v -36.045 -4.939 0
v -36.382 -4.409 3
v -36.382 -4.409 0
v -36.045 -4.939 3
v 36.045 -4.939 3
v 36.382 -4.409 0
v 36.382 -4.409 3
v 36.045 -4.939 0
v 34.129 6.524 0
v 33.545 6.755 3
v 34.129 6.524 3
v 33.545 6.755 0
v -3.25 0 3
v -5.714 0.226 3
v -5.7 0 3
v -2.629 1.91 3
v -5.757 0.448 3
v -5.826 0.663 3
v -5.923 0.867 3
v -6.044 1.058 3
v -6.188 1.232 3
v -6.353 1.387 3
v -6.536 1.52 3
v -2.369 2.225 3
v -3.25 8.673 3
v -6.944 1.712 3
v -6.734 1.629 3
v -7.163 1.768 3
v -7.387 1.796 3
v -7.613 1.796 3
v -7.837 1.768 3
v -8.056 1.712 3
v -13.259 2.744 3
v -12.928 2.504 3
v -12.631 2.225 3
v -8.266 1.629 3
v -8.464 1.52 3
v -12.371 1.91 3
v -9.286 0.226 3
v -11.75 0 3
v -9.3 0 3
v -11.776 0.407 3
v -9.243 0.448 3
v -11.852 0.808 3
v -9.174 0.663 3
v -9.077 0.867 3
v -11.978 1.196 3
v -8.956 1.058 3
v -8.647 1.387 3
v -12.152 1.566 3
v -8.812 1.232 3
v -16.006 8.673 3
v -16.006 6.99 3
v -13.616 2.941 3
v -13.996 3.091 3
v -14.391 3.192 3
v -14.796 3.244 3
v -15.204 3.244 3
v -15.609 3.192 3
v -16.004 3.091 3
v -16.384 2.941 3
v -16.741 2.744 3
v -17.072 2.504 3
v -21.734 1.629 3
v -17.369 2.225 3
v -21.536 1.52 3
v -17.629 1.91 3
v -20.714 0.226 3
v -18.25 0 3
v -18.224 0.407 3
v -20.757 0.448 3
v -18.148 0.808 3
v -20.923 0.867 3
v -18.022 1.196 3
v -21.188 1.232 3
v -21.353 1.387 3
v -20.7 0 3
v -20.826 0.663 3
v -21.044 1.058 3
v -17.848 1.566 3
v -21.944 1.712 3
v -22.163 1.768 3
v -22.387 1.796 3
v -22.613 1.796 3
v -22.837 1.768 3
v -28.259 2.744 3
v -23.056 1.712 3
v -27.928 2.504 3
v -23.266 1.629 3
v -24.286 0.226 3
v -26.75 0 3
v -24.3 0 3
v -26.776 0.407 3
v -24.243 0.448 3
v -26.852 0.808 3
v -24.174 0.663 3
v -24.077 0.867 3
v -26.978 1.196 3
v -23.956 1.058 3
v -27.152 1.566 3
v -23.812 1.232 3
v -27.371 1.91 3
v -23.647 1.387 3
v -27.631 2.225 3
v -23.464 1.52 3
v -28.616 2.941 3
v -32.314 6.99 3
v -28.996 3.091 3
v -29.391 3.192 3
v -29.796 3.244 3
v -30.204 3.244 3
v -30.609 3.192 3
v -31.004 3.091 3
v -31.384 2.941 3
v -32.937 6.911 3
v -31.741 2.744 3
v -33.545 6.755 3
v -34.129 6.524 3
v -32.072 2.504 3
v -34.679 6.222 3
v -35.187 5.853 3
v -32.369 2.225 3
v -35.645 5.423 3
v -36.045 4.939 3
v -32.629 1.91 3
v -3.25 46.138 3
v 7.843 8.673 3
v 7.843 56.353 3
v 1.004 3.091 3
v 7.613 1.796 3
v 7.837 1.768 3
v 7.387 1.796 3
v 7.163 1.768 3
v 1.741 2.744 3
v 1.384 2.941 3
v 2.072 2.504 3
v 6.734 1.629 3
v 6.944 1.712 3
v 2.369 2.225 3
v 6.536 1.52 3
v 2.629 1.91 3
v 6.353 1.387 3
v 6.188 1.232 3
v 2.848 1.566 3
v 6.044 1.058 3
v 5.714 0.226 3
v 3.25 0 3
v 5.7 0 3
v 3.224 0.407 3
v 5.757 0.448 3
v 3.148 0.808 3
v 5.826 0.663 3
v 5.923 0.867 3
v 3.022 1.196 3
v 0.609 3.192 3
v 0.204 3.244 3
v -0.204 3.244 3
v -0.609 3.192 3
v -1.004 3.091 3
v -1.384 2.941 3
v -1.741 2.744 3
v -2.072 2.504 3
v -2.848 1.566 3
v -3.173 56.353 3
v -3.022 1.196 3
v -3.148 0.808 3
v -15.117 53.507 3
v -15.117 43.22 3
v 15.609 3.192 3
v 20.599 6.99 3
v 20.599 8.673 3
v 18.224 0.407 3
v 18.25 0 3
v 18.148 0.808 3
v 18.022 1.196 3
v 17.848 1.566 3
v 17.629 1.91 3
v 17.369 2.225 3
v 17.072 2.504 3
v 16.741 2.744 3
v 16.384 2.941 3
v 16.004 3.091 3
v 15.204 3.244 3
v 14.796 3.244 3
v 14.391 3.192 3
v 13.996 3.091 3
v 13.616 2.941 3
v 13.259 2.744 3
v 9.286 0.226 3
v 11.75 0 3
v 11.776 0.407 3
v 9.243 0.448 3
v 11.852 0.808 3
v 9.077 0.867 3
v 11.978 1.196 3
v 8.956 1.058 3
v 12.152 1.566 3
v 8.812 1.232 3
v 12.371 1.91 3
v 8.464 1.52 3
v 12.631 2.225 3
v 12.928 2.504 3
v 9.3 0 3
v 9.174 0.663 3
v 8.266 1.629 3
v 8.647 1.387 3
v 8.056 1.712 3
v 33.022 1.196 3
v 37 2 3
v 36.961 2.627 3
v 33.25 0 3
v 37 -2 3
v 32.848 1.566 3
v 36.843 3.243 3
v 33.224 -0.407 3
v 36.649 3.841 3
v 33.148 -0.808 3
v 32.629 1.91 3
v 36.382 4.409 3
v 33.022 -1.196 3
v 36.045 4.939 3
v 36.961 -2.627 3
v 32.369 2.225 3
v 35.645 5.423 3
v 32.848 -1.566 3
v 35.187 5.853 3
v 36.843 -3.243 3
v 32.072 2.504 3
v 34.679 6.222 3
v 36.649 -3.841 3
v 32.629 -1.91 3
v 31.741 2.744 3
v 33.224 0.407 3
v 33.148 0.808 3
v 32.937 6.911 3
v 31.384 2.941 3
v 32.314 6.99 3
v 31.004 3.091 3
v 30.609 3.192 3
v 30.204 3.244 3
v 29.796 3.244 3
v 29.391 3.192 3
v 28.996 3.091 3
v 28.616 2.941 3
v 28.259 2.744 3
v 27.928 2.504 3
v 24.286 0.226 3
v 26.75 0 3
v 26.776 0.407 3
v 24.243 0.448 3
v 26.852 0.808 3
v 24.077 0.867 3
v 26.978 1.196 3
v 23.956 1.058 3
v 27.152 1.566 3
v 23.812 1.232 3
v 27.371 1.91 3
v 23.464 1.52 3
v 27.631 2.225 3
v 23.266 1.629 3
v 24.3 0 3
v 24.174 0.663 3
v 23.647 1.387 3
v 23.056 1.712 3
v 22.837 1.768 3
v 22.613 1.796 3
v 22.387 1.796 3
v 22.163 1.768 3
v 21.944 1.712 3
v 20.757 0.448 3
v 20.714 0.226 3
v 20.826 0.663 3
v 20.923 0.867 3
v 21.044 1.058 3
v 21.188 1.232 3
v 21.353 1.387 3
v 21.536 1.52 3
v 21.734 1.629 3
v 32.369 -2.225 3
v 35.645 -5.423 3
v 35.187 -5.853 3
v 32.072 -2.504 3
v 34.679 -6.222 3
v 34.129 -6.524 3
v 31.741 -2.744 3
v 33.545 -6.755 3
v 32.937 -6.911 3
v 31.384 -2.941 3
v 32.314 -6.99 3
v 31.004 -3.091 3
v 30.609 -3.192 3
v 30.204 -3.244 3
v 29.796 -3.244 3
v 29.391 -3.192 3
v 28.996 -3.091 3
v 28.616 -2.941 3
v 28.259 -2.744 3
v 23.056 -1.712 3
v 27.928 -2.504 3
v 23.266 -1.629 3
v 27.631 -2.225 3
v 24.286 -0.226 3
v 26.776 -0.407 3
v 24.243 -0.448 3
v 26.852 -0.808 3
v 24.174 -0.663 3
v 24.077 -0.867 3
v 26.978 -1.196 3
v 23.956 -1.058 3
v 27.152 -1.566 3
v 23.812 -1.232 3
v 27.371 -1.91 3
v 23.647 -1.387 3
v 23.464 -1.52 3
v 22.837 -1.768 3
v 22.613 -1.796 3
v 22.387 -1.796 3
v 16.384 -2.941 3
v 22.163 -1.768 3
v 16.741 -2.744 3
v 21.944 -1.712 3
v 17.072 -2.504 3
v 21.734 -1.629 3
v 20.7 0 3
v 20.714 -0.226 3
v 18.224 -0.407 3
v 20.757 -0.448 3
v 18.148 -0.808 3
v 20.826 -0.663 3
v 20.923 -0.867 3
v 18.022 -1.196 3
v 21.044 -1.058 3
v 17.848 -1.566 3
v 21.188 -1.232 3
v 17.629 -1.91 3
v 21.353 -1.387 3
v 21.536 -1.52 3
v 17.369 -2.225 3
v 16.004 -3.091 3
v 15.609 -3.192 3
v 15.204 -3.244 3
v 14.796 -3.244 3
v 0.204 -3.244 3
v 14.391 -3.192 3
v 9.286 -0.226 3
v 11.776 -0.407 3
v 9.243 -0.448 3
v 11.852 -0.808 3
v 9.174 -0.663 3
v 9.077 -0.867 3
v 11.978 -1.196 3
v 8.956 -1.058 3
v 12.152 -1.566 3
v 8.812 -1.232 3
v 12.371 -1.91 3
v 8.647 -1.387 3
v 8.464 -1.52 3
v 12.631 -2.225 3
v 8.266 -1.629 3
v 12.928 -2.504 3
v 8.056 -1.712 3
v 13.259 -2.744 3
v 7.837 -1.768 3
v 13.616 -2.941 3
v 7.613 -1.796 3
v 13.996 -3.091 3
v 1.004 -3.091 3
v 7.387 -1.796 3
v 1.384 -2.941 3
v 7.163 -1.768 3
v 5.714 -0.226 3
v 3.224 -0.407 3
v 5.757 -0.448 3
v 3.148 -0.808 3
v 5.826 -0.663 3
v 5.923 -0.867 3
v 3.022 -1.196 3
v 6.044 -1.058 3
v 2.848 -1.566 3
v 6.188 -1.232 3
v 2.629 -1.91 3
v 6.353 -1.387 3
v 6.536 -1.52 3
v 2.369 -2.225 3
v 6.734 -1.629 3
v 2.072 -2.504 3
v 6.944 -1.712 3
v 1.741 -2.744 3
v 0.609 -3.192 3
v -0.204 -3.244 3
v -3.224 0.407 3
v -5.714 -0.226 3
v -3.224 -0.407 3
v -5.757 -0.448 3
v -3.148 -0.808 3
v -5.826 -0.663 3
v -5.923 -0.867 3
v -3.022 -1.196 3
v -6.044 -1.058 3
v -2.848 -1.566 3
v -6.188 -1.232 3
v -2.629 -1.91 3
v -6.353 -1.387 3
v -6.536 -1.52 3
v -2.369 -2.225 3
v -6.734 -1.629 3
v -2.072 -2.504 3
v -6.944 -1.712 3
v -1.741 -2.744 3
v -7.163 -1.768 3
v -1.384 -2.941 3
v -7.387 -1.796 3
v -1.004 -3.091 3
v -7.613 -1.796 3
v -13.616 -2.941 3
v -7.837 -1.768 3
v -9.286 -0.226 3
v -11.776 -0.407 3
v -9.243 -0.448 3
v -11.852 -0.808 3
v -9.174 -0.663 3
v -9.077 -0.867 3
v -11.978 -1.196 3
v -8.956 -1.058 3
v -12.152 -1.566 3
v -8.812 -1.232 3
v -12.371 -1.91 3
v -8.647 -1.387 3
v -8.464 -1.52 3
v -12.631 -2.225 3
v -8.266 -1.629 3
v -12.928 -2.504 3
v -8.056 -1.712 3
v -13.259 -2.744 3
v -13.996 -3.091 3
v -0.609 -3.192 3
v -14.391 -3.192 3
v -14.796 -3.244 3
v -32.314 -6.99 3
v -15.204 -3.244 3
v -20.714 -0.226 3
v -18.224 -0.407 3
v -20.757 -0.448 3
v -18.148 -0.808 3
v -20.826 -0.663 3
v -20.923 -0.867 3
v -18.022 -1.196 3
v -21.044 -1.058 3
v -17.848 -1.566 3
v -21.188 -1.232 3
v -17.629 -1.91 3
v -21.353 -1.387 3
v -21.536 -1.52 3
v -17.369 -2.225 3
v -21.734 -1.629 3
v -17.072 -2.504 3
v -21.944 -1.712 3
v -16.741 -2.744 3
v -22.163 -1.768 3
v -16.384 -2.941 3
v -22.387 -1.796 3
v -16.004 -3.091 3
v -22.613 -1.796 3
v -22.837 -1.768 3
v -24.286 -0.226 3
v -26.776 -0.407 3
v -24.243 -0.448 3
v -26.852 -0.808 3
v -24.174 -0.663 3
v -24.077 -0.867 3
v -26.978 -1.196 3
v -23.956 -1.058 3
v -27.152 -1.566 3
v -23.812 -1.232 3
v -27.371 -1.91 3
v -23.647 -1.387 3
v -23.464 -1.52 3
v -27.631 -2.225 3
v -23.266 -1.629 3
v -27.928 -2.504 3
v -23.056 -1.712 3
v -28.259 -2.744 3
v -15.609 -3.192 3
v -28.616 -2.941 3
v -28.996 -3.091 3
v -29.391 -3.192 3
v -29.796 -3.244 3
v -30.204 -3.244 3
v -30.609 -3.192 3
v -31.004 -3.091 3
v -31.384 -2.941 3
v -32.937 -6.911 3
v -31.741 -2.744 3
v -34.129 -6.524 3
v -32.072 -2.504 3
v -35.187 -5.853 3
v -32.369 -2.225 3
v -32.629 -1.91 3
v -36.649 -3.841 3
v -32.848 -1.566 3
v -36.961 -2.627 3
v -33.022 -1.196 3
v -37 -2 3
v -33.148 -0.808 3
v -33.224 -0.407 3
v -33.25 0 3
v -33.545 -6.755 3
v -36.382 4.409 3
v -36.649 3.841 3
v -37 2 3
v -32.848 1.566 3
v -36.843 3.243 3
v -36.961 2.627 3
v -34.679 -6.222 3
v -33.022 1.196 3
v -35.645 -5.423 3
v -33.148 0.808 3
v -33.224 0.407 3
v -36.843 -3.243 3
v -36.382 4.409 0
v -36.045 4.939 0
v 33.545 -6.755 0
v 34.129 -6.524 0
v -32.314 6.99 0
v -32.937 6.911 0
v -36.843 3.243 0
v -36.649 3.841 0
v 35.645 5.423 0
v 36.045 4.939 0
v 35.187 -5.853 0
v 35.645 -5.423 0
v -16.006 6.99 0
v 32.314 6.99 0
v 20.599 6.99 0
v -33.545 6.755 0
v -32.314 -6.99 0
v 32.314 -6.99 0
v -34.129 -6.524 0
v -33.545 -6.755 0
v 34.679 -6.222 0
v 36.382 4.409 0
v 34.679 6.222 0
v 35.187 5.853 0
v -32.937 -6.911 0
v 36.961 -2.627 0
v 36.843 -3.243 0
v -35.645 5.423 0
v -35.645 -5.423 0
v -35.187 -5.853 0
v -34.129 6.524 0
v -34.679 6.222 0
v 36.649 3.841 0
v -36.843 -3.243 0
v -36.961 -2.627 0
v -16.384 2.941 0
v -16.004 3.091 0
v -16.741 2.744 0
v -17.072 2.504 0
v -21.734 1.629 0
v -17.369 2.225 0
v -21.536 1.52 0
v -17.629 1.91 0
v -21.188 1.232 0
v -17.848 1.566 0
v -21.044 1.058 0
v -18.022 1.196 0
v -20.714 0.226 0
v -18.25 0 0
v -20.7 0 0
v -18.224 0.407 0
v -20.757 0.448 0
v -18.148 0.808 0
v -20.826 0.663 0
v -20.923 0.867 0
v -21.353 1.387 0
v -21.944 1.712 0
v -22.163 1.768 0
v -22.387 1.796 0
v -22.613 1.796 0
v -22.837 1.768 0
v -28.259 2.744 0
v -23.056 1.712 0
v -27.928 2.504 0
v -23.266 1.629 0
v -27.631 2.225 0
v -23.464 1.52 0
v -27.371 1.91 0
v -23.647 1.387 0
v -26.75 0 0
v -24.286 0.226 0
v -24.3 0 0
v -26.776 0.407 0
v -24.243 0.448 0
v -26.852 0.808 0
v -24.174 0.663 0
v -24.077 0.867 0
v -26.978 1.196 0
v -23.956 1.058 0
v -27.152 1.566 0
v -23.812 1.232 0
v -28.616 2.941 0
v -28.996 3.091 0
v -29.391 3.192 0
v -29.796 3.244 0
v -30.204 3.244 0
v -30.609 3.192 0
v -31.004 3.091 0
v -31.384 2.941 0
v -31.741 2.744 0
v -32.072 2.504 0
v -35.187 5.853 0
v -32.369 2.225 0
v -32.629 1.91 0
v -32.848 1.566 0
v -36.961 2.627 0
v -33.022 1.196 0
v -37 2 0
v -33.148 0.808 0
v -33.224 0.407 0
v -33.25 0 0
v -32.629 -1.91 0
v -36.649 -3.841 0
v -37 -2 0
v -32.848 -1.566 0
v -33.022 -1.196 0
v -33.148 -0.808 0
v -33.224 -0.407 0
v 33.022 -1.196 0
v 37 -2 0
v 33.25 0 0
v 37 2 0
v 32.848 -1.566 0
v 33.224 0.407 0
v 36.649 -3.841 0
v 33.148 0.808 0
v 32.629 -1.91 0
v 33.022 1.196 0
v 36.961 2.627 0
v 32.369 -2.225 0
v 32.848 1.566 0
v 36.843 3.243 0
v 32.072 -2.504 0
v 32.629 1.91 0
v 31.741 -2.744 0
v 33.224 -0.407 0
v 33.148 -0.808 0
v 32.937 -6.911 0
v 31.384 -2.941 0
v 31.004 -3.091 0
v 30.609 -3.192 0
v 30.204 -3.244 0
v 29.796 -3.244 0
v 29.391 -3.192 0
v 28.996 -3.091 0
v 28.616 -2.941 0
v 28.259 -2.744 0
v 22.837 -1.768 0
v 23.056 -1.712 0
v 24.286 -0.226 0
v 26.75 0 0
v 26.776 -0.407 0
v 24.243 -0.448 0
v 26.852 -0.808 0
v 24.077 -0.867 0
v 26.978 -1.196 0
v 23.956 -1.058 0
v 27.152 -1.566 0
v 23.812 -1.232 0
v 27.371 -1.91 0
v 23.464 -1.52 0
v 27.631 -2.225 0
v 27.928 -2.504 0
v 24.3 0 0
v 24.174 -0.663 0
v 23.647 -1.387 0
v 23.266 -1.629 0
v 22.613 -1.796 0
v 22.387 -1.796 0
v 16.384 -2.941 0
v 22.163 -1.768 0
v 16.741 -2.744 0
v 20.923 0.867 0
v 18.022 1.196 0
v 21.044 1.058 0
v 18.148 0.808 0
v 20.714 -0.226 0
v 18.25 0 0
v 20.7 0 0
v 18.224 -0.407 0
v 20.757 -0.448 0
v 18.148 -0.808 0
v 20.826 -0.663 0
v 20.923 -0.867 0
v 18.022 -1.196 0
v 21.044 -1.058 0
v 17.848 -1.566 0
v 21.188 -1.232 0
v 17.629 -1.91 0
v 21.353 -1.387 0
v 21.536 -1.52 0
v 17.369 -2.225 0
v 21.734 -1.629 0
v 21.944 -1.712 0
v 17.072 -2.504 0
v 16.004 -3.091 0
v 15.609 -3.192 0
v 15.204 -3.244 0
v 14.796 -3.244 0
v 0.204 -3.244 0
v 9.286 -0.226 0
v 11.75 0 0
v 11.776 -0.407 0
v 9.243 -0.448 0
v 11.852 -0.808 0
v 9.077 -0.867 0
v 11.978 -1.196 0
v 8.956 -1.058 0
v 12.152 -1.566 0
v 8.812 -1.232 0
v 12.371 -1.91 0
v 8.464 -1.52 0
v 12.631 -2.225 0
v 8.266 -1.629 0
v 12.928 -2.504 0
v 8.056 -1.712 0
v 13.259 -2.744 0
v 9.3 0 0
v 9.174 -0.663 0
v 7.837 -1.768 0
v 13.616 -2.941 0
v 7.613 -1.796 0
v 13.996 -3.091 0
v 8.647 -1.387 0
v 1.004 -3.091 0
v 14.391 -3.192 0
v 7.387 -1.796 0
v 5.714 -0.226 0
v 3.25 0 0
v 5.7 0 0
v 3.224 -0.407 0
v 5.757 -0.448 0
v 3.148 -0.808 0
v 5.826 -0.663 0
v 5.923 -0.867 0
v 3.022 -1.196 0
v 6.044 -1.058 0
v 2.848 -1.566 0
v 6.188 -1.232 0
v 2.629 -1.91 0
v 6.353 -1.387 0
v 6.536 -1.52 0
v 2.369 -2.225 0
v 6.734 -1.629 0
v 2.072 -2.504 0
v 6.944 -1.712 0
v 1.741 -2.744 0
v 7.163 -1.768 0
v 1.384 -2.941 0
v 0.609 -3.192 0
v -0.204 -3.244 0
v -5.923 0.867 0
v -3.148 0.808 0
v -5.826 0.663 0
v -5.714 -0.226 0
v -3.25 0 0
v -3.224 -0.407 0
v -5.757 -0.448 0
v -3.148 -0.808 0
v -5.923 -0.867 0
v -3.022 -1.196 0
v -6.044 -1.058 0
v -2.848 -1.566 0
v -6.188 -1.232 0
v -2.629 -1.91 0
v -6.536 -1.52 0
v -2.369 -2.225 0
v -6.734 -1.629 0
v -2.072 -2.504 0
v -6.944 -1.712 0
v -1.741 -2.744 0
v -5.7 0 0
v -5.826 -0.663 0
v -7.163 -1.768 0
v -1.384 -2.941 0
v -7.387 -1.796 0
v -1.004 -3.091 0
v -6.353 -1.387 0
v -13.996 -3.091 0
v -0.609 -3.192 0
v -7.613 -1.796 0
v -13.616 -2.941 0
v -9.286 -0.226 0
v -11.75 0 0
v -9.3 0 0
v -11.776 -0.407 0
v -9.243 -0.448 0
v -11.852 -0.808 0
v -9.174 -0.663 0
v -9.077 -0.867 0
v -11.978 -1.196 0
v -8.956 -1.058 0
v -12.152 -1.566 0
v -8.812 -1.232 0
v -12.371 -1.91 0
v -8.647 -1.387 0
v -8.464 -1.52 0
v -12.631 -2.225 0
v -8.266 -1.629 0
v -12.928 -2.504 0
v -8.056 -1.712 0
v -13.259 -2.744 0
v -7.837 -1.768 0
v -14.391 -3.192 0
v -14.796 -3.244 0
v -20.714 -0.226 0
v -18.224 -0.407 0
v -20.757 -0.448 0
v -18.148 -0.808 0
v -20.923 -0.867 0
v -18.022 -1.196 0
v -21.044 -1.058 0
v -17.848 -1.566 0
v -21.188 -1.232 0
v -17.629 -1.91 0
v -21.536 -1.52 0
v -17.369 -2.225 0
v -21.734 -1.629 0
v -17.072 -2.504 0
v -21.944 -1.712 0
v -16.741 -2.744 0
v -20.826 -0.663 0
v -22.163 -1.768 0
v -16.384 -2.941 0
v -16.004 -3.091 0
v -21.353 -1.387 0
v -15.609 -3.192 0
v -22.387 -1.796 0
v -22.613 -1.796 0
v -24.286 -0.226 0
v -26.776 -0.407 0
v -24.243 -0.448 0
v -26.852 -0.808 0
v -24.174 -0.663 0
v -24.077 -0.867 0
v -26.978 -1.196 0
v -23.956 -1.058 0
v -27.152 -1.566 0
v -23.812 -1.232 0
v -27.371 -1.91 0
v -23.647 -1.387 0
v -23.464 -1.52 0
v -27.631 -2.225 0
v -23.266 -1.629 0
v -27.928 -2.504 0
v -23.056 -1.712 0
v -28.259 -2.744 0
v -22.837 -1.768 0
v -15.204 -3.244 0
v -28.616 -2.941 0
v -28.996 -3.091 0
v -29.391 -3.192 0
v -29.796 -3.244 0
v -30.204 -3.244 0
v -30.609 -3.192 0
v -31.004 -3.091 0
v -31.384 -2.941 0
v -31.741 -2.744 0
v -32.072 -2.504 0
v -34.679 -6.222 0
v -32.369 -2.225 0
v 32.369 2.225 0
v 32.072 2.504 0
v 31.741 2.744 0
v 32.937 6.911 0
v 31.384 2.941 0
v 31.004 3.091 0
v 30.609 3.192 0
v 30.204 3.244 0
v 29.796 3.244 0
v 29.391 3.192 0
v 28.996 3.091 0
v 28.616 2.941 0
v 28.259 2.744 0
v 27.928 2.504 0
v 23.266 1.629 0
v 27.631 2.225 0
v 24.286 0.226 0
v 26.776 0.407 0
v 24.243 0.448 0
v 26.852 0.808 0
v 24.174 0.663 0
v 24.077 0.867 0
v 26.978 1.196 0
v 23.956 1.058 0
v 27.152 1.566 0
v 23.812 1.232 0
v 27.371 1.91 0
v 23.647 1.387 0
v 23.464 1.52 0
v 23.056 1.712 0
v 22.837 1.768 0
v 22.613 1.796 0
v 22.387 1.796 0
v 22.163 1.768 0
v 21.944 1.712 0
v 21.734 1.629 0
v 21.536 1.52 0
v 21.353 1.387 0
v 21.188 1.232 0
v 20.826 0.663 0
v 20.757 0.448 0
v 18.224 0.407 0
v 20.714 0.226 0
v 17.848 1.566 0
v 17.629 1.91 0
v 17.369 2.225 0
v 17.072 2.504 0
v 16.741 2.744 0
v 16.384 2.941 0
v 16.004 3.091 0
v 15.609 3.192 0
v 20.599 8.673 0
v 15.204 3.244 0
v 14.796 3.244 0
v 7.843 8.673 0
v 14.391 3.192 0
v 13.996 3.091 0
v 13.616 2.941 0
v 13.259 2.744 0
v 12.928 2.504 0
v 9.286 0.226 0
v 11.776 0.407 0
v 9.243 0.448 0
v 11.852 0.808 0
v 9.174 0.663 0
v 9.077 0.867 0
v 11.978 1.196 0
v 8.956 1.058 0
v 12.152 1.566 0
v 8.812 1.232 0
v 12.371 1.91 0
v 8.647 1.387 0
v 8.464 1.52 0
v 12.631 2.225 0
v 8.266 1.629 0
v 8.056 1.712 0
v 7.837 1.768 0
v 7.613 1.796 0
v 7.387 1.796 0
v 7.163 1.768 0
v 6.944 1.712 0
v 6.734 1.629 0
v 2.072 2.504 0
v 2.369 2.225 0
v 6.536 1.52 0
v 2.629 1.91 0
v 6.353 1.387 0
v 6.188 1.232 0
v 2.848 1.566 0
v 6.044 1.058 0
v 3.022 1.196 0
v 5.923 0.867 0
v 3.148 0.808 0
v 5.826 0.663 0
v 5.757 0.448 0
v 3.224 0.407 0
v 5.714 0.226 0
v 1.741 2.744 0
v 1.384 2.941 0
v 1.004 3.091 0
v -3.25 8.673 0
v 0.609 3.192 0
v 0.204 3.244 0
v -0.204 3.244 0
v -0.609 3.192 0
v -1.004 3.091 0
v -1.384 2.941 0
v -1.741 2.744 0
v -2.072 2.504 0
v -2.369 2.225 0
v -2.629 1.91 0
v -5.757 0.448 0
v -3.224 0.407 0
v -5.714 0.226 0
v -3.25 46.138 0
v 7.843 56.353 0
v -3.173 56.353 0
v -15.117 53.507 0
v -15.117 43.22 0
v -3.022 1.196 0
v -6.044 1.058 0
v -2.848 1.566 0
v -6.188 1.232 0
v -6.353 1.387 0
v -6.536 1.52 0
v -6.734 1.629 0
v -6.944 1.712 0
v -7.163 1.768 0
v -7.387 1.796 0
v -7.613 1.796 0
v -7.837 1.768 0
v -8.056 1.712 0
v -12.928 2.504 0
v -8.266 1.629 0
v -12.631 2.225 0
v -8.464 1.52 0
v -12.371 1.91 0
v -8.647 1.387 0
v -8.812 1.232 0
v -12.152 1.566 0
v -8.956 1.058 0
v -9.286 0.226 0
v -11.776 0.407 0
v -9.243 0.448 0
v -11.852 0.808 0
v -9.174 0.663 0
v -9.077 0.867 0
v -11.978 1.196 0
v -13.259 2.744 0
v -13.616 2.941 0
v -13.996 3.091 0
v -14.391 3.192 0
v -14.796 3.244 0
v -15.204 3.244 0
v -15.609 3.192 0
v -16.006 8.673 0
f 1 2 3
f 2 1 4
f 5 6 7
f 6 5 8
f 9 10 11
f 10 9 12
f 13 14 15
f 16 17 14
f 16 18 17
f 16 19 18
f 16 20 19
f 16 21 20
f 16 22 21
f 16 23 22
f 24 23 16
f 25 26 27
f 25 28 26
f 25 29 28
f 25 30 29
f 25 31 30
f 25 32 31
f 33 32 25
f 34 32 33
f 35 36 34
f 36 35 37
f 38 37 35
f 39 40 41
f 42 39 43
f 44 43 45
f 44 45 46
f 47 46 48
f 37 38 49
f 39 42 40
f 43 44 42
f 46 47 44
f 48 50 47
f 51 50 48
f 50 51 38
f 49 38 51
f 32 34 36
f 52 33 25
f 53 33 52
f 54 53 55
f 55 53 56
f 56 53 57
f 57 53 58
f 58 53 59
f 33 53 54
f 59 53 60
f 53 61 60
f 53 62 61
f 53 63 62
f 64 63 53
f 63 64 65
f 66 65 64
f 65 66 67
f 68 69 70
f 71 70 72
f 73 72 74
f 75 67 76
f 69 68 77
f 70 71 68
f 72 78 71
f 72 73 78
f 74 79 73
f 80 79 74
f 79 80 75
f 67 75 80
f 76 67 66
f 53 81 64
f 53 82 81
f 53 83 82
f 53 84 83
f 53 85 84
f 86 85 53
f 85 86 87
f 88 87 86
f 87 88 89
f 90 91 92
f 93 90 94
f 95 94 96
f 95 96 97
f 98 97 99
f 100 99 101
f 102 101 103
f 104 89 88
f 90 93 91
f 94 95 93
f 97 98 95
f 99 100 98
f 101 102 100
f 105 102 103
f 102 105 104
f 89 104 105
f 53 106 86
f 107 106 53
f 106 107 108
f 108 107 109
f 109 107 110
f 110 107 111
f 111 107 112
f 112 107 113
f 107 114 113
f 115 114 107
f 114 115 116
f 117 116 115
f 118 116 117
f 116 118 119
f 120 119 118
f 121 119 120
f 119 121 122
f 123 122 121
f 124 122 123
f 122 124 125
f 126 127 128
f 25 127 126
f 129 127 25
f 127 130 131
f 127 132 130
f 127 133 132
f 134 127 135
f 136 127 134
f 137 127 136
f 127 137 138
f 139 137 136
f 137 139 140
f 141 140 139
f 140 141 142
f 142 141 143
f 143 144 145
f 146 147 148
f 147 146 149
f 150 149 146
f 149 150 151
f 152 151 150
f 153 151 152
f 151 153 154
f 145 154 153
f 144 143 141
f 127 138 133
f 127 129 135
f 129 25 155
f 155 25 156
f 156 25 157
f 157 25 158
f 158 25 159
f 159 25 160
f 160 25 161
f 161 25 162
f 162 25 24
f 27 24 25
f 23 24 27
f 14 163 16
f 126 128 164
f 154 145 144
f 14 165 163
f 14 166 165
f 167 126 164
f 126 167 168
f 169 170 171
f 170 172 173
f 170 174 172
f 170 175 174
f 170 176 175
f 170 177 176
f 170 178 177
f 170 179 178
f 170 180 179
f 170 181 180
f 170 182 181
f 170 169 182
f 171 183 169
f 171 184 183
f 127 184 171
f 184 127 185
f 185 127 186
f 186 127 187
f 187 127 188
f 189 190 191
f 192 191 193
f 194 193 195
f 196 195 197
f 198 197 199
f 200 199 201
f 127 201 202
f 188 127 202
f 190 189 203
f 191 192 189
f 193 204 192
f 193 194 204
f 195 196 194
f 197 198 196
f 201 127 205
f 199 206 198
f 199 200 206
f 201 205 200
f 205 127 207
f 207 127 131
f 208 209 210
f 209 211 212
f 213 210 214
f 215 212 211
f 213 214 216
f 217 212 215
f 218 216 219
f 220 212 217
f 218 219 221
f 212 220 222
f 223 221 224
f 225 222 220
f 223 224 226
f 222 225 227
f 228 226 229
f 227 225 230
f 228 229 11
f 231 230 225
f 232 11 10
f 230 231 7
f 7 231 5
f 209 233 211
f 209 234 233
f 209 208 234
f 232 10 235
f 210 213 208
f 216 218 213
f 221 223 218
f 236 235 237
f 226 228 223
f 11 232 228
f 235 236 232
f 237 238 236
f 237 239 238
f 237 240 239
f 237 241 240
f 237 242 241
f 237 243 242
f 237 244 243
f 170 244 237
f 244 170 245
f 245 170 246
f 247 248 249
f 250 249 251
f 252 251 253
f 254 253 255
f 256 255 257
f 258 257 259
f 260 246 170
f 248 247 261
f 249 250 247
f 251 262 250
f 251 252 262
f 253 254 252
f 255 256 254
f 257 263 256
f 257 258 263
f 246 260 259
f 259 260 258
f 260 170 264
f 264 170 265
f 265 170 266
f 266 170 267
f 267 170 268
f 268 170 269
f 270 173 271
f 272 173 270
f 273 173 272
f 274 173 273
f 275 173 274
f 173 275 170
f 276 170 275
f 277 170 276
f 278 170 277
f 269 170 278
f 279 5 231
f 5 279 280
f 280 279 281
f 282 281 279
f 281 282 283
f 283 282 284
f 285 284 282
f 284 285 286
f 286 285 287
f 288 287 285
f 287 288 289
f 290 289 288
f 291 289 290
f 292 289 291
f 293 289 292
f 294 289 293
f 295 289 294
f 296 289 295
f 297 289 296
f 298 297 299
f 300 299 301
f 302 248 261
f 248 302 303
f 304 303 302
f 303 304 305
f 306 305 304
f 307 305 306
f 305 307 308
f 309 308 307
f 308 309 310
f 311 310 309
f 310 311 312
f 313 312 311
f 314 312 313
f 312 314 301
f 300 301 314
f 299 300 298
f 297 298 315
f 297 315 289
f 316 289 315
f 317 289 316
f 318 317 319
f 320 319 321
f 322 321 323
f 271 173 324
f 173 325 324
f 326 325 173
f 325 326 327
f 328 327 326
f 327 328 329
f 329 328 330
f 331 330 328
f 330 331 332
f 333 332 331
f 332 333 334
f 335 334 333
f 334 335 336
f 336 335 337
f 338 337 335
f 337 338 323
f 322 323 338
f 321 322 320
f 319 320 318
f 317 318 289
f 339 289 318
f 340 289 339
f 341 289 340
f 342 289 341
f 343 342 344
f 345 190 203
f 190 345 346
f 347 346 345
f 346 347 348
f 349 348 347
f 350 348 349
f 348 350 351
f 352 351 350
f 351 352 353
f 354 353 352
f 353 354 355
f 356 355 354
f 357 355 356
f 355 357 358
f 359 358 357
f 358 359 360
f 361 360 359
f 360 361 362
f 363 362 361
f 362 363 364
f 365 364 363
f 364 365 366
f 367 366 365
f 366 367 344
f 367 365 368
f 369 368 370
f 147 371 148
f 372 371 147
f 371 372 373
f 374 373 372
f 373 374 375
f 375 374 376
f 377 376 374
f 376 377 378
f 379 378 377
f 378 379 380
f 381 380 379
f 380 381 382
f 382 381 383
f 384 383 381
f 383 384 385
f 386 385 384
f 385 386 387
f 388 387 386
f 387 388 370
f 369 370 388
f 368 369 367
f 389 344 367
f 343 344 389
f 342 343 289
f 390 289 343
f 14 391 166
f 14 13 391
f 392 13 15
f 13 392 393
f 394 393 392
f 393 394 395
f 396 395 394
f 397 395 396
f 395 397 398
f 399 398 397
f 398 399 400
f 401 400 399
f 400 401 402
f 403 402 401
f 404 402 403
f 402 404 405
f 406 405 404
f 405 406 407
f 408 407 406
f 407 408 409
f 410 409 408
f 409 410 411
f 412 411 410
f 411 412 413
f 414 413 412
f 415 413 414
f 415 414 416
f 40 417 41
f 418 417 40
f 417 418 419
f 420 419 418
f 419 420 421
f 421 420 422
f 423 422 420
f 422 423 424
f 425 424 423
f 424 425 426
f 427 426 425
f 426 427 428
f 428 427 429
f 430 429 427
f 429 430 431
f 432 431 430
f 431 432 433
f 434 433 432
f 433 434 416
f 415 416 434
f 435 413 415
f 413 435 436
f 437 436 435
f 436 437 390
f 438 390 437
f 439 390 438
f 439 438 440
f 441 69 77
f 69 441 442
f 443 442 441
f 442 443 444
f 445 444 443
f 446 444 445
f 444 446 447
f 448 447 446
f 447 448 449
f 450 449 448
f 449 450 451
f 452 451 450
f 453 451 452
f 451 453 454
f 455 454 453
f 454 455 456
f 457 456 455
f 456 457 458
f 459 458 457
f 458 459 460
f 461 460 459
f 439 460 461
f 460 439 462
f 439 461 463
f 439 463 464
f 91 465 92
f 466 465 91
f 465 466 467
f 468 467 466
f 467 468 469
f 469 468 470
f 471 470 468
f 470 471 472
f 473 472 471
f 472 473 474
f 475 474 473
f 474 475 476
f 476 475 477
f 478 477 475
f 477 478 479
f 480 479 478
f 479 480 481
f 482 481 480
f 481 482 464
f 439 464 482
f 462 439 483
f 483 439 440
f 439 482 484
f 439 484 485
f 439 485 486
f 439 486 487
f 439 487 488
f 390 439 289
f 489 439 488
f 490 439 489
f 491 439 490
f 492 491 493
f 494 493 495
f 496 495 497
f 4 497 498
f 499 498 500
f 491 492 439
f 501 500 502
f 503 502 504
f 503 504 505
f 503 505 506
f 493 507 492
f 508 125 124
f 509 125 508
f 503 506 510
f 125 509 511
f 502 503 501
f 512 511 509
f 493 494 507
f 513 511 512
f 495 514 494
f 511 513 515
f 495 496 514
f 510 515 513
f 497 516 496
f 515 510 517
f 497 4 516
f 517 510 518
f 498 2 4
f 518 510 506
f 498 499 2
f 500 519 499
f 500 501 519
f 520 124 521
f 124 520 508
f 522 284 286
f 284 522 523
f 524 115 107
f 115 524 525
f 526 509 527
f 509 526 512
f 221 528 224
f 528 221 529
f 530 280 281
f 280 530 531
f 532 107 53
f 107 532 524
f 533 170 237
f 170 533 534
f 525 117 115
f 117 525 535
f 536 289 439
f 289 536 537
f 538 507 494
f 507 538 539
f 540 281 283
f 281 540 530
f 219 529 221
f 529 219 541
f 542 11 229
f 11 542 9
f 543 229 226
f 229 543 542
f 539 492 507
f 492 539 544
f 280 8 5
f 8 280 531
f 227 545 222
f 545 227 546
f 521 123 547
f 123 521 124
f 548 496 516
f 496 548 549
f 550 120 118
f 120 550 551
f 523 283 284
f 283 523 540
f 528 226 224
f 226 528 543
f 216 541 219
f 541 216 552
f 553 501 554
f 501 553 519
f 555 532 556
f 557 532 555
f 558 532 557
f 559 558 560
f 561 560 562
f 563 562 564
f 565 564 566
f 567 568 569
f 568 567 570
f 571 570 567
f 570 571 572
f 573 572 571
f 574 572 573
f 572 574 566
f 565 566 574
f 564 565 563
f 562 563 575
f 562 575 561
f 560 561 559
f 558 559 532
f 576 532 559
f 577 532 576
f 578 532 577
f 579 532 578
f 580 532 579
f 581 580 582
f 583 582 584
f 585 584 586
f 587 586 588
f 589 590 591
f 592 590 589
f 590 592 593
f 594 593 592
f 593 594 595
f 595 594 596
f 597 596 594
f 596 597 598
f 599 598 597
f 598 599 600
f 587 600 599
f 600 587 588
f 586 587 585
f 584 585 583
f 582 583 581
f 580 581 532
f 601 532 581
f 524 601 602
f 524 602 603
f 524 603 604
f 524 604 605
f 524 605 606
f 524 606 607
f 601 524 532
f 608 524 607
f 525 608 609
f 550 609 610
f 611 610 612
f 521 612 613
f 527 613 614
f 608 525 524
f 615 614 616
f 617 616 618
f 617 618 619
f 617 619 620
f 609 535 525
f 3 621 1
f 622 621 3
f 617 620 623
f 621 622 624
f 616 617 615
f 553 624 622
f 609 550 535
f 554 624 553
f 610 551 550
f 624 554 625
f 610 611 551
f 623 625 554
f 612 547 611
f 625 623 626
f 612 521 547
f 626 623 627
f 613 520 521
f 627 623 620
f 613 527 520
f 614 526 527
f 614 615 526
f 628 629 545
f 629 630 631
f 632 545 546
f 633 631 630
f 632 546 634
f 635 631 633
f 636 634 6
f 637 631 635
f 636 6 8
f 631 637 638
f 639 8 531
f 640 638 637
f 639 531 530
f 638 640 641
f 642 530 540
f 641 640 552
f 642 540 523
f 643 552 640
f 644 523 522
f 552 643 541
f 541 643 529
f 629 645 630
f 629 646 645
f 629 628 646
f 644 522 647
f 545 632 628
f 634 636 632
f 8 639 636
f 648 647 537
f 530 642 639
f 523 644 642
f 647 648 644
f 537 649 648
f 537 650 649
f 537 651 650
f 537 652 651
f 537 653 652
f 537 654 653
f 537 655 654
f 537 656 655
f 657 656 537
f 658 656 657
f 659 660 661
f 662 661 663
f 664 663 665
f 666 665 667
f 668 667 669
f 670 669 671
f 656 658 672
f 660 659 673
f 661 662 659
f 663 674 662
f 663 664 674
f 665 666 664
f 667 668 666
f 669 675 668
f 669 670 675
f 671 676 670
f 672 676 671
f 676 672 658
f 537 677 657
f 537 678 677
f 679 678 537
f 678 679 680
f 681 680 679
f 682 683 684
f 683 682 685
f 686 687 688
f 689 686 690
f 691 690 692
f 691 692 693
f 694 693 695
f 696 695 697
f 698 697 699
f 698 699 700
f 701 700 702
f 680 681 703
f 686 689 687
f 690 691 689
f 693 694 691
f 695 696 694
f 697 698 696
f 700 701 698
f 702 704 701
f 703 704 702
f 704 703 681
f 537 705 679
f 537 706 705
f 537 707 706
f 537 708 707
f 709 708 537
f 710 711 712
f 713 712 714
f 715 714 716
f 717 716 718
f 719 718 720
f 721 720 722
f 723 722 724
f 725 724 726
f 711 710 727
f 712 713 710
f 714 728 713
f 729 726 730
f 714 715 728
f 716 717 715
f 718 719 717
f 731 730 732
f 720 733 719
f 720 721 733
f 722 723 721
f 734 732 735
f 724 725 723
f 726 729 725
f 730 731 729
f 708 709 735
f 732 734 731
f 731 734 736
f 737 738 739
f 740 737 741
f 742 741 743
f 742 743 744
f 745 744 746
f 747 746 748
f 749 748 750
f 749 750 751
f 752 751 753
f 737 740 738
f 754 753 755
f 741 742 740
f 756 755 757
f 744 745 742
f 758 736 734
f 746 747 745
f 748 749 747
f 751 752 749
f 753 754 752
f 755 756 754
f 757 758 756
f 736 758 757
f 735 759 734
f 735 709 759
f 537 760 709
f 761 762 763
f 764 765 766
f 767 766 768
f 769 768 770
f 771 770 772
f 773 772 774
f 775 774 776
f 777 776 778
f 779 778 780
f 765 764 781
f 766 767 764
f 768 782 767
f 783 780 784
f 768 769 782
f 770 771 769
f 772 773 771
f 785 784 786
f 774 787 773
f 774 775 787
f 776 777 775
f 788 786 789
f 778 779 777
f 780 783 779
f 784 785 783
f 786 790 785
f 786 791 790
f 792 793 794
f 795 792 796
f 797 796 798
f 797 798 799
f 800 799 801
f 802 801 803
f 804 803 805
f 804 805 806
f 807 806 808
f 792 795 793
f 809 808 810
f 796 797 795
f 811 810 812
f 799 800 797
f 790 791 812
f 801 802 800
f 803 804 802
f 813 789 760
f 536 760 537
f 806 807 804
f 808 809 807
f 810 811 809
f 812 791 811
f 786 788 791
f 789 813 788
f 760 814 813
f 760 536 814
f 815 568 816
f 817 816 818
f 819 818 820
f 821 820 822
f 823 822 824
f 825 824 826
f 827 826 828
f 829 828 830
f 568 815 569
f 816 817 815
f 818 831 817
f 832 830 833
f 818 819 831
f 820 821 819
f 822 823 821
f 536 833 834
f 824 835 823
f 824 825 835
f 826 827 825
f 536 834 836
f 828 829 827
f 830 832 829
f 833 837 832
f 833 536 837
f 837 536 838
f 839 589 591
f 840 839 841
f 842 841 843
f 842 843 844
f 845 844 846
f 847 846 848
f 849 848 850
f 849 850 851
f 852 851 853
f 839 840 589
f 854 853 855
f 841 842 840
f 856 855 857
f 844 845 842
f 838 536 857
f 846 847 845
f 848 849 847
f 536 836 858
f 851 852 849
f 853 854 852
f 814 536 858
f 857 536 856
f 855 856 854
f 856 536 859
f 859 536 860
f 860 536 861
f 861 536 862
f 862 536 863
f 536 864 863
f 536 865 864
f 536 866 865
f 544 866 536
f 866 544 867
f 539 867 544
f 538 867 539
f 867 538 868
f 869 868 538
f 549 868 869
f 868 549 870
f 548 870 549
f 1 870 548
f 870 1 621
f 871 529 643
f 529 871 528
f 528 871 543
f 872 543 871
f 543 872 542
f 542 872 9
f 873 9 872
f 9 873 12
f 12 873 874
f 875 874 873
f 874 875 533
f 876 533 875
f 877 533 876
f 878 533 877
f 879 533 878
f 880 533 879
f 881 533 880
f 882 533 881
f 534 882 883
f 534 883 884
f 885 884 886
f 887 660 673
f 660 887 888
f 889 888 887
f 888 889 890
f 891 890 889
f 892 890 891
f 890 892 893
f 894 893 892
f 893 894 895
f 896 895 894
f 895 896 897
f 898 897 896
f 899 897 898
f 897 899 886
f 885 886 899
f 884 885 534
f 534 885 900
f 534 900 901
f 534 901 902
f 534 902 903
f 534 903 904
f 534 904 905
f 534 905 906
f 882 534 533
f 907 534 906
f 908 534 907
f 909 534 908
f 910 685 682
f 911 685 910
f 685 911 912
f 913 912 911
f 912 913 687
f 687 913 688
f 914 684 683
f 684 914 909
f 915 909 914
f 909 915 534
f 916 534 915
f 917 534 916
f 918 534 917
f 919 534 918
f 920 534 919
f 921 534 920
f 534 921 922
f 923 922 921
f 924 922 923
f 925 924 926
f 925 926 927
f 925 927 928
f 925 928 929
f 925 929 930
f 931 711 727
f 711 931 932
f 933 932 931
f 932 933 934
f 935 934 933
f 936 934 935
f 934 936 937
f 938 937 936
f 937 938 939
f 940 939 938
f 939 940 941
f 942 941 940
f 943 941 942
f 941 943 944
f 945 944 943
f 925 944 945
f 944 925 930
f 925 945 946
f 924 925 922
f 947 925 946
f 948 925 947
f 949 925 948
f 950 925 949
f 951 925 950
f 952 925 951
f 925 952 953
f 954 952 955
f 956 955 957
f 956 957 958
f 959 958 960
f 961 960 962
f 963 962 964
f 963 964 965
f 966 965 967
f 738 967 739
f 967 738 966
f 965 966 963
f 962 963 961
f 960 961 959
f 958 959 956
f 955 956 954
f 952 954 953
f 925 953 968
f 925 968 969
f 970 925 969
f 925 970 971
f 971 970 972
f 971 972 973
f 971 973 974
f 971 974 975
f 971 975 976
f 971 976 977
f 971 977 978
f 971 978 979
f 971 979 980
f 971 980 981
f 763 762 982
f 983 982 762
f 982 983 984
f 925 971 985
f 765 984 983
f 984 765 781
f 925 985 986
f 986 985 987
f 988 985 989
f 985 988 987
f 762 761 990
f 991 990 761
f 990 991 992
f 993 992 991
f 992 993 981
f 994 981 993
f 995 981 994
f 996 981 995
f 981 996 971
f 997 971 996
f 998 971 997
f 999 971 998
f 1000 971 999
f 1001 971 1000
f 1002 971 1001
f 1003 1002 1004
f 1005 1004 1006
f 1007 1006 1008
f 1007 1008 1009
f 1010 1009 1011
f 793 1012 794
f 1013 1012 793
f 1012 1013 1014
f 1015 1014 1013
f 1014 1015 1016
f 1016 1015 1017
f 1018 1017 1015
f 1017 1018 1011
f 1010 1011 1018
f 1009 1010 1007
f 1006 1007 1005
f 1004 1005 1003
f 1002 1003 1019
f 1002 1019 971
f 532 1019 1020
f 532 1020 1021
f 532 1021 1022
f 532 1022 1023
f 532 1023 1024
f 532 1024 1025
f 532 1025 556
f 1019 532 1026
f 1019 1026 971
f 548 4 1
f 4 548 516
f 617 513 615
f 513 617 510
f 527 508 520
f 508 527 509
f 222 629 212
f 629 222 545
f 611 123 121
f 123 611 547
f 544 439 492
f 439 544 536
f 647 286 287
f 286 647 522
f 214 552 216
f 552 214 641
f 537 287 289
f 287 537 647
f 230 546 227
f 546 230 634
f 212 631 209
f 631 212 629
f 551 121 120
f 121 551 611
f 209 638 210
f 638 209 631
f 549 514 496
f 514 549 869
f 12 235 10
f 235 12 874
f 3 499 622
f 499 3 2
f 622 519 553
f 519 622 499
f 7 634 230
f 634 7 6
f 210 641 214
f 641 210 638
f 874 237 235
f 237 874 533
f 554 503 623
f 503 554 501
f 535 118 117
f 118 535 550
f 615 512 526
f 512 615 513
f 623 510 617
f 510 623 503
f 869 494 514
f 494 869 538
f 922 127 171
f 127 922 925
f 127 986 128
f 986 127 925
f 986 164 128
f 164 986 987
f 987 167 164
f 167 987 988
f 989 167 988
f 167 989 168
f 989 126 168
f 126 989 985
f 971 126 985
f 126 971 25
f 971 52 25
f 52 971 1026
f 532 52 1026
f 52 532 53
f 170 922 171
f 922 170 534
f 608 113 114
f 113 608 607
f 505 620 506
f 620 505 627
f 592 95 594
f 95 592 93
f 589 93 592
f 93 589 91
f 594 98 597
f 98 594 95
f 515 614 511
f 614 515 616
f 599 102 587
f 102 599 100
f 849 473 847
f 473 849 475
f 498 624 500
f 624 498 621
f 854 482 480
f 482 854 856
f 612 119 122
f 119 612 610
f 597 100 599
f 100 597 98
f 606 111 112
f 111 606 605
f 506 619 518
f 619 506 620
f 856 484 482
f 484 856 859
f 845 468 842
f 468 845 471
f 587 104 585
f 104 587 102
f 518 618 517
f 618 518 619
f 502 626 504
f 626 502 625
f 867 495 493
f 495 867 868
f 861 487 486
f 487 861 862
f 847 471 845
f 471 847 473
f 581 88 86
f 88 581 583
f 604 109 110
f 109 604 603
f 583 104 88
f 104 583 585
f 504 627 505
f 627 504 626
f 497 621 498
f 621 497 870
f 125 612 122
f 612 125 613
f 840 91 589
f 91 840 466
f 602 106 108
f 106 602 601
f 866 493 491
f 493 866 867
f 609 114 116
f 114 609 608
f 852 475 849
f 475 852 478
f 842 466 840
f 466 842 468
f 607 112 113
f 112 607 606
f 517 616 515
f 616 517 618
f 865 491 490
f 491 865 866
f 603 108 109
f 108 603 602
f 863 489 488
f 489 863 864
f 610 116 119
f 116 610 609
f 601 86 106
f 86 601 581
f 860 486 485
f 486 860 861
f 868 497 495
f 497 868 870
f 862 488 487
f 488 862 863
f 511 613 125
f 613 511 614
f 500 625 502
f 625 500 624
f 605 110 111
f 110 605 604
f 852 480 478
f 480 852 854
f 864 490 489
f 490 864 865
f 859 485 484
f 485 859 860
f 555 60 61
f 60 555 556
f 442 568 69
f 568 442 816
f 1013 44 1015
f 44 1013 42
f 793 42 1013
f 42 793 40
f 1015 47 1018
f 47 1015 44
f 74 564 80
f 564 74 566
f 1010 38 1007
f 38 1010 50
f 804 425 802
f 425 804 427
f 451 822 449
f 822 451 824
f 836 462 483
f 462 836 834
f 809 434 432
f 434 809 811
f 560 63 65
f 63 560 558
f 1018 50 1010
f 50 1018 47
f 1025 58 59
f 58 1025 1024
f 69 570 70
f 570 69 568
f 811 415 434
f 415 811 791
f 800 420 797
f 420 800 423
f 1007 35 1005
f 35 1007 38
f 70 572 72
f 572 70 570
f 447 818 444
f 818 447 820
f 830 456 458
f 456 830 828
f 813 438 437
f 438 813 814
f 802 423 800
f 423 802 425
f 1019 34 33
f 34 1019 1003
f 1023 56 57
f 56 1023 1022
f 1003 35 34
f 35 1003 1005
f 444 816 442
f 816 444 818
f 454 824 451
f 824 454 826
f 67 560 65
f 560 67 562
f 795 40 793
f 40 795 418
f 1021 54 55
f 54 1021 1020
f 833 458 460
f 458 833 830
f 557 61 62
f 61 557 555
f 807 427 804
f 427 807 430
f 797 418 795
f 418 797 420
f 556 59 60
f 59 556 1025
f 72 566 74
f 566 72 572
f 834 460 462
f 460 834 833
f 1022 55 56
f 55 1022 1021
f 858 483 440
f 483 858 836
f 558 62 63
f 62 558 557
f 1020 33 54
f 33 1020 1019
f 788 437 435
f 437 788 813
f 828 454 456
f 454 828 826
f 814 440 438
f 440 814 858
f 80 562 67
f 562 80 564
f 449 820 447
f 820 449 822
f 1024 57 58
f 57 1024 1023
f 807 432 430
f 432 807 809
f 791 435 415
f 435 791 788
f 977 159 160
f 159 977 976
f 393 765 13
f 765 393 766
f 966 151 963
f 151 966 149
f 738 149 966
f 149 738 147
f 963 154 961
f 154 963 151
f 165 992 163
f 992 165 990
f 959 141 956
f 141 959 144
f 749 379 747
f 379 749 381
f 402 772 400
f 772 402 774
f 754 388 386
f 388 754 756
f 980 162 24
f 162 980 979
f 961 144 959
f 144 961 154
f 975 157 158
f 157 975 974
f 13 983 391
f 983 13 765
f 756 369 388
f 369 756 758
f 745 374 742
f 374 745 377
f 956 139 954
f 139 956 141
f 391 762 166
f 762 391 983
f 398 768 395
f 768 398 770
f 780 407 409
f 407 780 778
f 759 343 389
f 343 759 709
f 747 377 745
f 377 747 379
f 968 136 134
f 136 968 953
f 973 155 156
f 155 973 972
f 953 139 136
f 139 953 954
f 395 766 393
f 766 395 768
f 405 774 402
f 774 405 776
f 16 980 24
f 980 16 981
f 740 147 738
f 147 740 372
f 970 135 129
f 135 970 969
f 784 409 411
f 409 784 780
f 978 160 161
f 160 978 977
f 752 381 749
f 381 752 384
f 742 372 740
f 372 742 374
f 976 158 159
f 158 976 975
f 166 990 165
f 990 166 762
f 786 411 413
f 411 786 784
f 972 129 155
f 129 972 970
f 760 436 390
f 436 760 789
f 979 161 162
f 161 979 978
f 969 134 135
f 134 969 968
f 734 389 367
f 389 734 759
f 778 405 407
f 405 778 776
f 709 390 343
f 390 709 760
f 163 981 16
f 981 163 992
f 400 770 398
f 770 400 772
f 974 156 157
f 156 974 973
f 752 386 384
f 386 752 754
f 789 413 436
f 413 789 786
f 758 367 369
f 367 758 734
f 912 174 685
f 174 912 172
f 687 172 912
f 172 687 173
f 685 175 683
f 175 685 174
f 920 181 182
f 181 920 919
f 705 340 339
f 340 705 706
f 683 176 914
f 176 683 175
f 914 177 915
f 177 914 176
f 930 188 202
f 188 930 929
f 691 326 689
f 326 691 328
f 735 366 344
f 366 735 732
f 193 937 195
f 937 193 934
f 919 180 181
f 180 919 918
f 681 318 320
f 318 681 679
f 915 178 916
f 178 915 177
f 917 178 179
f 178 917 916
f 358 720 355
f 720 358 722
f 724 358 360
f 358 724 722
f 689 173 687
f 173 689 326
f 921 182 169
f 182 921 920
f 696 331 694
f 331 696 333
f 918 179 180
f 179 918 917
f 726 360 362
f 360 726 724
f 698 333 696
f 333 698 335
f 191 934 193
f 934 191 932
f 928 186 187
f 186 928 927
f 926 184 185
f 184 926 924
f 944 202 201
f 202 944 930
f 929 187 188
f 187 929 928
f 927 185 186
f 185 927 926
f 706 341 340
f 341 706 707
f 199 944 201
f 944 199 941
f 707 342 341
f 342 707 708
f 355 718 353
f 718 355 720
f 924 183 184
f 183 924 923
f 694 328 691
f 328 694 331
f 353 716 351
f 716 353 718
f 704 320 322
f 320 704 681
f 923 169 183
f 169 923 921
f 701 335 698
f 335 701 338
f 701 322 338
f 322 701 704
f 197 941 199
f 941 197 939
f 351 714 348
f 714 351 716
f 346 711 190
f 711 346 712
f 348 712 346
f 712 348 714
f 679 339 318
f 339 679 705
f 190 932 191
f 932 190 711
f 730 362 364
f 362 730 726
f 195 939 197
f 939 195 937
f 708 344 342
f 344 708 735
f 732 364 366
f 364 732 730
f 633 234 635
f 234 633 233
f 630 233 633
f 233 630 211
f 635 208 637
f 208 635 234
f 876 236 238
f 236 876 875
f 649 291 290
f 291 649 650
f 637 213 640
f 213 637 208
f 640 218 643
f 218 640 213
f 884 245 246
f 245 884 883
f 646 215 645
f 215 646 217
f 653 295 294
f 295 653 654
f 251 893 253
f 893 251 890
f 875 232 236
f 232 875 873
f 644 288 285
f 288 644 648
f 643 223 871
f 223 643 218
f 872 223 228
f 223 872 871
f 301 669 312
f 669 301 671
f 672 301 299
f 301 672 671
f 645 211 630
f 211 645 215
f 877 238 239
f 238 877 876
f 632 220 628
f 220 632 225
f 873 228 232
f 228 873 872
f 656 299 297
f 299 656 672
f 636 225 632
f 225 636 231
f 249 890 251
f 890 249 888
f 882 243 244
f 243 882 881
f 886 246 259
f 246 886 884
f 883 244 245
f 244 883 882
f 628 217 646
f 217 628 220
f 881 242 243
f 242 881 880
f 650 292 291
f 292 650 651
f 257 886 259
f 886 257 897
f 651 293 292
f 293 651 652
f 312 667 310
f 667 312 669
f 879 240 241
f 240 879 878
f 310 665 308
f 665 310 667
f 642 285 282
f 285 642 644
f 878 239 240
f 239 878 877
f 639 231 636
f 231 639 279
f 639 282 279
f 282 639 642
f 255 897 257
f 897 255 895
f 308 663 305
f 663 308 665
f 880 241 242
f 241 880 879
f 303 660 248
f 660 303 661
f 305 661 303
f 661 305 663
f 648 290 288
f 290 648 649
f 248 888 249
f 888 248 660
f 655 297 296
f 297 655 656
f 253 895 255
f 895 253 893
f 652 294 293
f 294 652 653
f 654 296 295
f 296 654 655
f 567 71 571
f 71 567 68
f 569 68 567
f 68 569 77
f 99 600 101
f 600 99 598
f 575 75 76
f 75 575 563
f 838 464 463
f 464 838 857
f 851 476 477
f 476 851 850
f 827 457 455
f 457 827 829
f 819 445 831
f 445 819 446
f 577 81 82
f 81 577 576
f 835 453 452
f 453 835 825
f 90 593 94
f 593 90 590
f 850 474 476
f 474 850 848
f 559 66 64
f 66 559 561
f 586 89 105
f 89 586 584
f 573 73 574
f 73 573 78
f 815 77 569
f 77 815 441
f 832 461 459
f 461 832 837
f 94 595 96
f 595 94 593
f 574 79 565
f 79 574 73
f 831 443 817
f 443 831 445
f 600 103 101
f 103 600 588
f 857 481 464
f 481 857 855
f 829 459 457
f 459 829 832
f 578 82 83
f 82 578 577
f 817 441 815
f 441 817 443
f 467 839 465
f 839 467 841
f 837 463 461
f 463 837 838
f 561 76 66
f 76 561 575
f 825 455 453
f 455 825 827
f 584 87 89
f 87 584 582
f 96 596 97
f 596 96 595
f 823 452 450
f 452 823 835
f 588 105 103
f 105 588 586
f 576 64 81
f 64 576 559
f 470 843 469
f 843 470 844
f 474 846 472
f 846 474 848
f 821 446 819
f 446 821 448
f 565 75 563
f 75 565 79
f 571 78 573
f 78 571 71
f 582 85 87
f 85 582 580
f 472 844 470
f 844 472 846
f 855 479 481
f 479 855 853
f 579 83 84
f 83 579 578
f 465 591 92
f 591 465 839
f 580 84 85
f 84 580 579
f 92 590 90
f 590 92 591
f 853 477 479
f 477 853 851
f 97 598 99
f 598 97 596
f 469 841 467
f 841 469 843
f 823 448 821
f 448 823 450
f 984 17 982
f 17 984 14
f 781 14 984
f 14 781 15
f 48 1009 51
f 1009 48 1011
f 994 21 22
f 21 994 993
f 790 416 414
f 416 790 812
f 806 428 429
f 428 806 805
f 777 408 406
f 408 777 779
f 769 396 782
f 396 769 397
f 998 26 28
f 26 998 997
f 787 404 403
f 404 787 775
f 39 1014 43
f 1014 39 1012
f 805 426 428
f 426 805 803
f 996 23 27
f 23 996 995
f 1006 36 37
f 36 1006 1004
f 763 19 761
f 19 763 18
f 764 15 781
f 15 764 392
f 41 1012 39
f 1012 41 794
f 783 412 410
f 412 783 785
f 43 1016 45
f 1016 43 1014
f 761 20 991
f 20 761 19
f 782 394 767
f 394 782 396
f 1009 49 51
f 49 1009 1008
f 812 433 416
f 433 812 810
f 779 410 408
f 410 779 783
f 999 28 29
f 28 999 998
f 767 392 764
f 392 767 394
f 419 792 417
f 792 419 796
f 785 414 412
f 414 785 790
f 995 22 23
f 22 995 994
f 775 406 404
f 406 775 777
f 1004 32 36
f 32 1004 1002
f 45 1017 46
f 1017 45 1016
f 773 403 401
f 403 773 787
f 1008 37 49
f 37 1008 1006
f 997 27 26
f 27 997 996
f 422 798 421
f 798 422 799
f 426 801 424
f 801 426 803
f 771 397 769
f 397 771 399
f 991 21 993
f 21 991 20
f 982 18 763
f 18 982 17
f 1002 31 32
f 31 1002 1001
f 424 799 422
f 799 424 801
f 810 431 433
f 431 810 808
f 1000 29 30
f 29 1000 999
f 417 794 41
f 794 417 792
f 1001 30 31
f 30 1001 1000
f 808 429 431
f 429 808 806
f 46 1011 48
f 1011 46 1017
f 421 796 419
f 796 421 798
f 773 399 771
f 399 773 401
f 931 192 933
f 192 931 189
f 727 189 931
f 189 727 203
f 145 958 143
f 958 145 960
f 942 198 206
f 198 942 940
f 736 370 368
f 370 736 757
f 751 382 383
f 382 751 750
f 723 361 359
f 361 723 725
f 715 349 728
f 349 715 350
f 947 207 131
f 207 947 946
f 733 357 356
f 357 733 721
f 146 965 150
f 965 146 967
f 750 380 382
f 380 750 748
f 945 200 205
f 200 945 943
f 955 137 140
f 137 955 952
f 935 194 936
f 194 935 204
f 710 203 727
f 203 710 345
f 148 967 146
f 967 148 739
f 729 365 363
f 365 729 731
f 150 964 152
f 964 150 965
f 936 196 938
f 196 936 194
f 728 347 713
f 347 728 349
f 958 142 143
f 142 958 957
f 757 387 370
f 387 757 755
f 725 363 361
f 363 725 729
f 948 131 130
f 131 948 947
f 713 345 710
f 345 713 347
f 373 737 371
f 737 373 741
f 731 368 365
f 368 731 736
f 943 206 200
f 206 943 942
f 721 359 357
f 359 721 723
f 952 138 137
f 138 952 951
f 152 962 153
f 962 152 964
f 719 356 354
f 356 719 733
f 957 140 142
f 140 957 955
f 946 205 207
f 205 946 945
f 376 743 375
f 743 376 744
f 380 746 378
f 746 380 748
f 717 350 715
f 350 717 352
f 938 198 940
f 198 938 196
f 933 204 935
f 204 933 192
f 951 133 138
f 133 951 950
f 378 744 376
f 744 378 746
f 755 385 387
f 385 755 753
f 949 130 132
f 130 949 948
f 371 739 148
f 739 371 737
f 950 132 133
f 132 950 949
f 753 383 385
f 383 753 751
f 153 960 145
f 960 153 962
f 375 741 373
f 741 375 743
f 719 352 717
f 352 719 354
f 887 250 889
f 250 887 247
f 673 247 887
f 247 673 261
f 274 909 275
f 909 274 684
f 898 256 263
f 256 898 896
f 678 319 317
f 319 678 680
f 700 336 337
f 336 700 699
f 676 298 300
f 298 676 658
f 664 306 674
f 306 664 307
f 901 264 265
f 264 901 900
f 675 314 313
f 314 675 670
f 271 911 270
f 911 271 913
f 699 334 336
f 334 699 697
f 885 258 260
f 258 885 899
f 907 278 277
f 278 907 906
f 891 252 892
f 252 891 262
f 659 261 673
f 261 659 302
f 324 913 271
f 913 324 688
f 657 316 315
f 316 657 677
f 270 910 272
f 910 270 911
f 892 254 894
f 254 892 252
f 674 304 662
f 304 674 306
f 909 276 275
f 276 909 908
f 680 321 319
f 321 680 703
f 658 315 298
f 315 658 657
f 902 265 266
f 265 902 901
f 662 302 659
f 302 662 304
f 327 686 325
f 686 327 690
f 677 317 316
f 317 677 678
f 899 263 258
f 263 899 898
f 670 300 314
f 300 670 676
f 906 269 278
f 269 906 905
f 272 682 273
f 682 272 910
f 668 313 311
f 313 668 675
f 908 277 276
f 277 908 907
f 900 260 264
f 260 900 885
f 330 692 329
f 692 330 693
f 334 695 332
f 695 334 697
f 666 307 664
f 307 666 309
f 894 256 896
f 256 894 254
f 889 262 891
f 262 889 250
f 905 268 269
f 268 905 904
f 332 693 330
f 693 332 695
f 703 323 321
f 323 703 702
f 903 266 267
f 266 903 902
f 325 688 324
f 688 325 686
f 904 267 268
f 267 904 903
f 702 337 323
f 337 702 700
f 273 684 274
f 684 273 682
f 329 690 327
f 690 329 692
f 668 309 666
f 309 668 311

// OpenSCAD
$fn = 50;


difference() {
	union() {
		hull() {
			translate(v = [-32.0000000000, 2.0000000000, 0]) {
				cylinder(h = 3, r = 5);
			}
			translate(v = [32.0000000000, 2.0000000000, 0]) {
				cylinder(h = 3, r = 5);
			}
			translate(v = [-32.0000000000, -2.0000000000, 0]) {
				cylinder(h = 3, r = 5);
			}
			translate(v = [32.0000000000, -2.0000000000, 0]) {
				cylinder(h = 3, r = 5);
			}
		}
		translate(v = [0, 55, 0]) {
			linear_extrude(height = 3) {
				text(font = "DejaVu Sans Mono:style=Bold", halign = "center", size = 57.0000000000, text = "1", valign = "top");
			}
		}
	}
	union() {
		translate(v = [-30.0000000000, 0.0000000000, 0]) {
			translate(v = [0, 0, -100]) {
				cylinder(h = 200, r = 3.2500000000);
			}
		}
		translate(v = [-15.0000000000, 0.0000000000, 0]) {
			translate(v = [0, 0, -100]) {
				cylinder(h = 200, r = 3.2500000000);
			}
		}
		translate(v = [0, 0, -100]) {
			cylinder(h = 200, r = 3.2500000000);
		}
		translate(v = [15.0000000000, 0.0000000000, 0]) {
			translate(v = [0, 0, -100]) {
				cylinder(h = 200, r = 3.2500000000);
			}
		}
		translate(v = [30.0000000000, 0.0000000000, 0]) {
			translate(v = [0, 0, -100]) {
				cylinder(h = 200, r = 3.2500000000);
			}
		}
		translate(v = [-30.0000000000, 0.0000000000, 0]) {
			translate(v = [0, 0, -100]) {
				cylinder(h = 200, r = 1.8000000000);
			}
		}
		translate(v = [-22.5000000000, 0.0000000000, 0]) {
			translate(v = [0, 0, -100]) {
				cylinder(h = 200, r = 1.8000000000);
			}
		}
		translate(v = [-15.0000000000, 0.0000000000, 0]) {
			translate(v = [0, 0, -100]) {
				cylinder(h = 200, r = 1.8000000000);
			}
		}
		translate(v = [-7.5000000000, 0.0000000000, 0]) {
			translate(v = [0, 0, -100]) {
				cylinder(h = 200, r = 1.8000000000);
			}
		}
		translate(v = [0, 0, -100]) {
			cylinder(h = 200, r = 1.8000000000);
		}
		translate(v = [7.5000000000, 0.0000000000, 0]) {
			translate(v = [0, 0, -100]) {
				cylinder(h = 200, r = 1.8000000000);
			}
		}
		translate(v = [15.0000000000, 0.0000000000, 0]) {
			translate(v = [0, 0, -100]) {
				cylinder(h = 200, r = 1.8000000000);
			}
		}
		translate(v = [22.5000000000, 0.0000000000, 0]) {
			translate(v = [0, 0, -100]) {
				cylinder(h = 200, r = 1.8000000000);
			}
		}
		translate(v = [30.0000000000, 0.0000000000, 0]) {
			translate(v = [0, 0, -100]) {
				cylinder(h = 200, r = 1.8000000000);
			}
		}
	}
}
